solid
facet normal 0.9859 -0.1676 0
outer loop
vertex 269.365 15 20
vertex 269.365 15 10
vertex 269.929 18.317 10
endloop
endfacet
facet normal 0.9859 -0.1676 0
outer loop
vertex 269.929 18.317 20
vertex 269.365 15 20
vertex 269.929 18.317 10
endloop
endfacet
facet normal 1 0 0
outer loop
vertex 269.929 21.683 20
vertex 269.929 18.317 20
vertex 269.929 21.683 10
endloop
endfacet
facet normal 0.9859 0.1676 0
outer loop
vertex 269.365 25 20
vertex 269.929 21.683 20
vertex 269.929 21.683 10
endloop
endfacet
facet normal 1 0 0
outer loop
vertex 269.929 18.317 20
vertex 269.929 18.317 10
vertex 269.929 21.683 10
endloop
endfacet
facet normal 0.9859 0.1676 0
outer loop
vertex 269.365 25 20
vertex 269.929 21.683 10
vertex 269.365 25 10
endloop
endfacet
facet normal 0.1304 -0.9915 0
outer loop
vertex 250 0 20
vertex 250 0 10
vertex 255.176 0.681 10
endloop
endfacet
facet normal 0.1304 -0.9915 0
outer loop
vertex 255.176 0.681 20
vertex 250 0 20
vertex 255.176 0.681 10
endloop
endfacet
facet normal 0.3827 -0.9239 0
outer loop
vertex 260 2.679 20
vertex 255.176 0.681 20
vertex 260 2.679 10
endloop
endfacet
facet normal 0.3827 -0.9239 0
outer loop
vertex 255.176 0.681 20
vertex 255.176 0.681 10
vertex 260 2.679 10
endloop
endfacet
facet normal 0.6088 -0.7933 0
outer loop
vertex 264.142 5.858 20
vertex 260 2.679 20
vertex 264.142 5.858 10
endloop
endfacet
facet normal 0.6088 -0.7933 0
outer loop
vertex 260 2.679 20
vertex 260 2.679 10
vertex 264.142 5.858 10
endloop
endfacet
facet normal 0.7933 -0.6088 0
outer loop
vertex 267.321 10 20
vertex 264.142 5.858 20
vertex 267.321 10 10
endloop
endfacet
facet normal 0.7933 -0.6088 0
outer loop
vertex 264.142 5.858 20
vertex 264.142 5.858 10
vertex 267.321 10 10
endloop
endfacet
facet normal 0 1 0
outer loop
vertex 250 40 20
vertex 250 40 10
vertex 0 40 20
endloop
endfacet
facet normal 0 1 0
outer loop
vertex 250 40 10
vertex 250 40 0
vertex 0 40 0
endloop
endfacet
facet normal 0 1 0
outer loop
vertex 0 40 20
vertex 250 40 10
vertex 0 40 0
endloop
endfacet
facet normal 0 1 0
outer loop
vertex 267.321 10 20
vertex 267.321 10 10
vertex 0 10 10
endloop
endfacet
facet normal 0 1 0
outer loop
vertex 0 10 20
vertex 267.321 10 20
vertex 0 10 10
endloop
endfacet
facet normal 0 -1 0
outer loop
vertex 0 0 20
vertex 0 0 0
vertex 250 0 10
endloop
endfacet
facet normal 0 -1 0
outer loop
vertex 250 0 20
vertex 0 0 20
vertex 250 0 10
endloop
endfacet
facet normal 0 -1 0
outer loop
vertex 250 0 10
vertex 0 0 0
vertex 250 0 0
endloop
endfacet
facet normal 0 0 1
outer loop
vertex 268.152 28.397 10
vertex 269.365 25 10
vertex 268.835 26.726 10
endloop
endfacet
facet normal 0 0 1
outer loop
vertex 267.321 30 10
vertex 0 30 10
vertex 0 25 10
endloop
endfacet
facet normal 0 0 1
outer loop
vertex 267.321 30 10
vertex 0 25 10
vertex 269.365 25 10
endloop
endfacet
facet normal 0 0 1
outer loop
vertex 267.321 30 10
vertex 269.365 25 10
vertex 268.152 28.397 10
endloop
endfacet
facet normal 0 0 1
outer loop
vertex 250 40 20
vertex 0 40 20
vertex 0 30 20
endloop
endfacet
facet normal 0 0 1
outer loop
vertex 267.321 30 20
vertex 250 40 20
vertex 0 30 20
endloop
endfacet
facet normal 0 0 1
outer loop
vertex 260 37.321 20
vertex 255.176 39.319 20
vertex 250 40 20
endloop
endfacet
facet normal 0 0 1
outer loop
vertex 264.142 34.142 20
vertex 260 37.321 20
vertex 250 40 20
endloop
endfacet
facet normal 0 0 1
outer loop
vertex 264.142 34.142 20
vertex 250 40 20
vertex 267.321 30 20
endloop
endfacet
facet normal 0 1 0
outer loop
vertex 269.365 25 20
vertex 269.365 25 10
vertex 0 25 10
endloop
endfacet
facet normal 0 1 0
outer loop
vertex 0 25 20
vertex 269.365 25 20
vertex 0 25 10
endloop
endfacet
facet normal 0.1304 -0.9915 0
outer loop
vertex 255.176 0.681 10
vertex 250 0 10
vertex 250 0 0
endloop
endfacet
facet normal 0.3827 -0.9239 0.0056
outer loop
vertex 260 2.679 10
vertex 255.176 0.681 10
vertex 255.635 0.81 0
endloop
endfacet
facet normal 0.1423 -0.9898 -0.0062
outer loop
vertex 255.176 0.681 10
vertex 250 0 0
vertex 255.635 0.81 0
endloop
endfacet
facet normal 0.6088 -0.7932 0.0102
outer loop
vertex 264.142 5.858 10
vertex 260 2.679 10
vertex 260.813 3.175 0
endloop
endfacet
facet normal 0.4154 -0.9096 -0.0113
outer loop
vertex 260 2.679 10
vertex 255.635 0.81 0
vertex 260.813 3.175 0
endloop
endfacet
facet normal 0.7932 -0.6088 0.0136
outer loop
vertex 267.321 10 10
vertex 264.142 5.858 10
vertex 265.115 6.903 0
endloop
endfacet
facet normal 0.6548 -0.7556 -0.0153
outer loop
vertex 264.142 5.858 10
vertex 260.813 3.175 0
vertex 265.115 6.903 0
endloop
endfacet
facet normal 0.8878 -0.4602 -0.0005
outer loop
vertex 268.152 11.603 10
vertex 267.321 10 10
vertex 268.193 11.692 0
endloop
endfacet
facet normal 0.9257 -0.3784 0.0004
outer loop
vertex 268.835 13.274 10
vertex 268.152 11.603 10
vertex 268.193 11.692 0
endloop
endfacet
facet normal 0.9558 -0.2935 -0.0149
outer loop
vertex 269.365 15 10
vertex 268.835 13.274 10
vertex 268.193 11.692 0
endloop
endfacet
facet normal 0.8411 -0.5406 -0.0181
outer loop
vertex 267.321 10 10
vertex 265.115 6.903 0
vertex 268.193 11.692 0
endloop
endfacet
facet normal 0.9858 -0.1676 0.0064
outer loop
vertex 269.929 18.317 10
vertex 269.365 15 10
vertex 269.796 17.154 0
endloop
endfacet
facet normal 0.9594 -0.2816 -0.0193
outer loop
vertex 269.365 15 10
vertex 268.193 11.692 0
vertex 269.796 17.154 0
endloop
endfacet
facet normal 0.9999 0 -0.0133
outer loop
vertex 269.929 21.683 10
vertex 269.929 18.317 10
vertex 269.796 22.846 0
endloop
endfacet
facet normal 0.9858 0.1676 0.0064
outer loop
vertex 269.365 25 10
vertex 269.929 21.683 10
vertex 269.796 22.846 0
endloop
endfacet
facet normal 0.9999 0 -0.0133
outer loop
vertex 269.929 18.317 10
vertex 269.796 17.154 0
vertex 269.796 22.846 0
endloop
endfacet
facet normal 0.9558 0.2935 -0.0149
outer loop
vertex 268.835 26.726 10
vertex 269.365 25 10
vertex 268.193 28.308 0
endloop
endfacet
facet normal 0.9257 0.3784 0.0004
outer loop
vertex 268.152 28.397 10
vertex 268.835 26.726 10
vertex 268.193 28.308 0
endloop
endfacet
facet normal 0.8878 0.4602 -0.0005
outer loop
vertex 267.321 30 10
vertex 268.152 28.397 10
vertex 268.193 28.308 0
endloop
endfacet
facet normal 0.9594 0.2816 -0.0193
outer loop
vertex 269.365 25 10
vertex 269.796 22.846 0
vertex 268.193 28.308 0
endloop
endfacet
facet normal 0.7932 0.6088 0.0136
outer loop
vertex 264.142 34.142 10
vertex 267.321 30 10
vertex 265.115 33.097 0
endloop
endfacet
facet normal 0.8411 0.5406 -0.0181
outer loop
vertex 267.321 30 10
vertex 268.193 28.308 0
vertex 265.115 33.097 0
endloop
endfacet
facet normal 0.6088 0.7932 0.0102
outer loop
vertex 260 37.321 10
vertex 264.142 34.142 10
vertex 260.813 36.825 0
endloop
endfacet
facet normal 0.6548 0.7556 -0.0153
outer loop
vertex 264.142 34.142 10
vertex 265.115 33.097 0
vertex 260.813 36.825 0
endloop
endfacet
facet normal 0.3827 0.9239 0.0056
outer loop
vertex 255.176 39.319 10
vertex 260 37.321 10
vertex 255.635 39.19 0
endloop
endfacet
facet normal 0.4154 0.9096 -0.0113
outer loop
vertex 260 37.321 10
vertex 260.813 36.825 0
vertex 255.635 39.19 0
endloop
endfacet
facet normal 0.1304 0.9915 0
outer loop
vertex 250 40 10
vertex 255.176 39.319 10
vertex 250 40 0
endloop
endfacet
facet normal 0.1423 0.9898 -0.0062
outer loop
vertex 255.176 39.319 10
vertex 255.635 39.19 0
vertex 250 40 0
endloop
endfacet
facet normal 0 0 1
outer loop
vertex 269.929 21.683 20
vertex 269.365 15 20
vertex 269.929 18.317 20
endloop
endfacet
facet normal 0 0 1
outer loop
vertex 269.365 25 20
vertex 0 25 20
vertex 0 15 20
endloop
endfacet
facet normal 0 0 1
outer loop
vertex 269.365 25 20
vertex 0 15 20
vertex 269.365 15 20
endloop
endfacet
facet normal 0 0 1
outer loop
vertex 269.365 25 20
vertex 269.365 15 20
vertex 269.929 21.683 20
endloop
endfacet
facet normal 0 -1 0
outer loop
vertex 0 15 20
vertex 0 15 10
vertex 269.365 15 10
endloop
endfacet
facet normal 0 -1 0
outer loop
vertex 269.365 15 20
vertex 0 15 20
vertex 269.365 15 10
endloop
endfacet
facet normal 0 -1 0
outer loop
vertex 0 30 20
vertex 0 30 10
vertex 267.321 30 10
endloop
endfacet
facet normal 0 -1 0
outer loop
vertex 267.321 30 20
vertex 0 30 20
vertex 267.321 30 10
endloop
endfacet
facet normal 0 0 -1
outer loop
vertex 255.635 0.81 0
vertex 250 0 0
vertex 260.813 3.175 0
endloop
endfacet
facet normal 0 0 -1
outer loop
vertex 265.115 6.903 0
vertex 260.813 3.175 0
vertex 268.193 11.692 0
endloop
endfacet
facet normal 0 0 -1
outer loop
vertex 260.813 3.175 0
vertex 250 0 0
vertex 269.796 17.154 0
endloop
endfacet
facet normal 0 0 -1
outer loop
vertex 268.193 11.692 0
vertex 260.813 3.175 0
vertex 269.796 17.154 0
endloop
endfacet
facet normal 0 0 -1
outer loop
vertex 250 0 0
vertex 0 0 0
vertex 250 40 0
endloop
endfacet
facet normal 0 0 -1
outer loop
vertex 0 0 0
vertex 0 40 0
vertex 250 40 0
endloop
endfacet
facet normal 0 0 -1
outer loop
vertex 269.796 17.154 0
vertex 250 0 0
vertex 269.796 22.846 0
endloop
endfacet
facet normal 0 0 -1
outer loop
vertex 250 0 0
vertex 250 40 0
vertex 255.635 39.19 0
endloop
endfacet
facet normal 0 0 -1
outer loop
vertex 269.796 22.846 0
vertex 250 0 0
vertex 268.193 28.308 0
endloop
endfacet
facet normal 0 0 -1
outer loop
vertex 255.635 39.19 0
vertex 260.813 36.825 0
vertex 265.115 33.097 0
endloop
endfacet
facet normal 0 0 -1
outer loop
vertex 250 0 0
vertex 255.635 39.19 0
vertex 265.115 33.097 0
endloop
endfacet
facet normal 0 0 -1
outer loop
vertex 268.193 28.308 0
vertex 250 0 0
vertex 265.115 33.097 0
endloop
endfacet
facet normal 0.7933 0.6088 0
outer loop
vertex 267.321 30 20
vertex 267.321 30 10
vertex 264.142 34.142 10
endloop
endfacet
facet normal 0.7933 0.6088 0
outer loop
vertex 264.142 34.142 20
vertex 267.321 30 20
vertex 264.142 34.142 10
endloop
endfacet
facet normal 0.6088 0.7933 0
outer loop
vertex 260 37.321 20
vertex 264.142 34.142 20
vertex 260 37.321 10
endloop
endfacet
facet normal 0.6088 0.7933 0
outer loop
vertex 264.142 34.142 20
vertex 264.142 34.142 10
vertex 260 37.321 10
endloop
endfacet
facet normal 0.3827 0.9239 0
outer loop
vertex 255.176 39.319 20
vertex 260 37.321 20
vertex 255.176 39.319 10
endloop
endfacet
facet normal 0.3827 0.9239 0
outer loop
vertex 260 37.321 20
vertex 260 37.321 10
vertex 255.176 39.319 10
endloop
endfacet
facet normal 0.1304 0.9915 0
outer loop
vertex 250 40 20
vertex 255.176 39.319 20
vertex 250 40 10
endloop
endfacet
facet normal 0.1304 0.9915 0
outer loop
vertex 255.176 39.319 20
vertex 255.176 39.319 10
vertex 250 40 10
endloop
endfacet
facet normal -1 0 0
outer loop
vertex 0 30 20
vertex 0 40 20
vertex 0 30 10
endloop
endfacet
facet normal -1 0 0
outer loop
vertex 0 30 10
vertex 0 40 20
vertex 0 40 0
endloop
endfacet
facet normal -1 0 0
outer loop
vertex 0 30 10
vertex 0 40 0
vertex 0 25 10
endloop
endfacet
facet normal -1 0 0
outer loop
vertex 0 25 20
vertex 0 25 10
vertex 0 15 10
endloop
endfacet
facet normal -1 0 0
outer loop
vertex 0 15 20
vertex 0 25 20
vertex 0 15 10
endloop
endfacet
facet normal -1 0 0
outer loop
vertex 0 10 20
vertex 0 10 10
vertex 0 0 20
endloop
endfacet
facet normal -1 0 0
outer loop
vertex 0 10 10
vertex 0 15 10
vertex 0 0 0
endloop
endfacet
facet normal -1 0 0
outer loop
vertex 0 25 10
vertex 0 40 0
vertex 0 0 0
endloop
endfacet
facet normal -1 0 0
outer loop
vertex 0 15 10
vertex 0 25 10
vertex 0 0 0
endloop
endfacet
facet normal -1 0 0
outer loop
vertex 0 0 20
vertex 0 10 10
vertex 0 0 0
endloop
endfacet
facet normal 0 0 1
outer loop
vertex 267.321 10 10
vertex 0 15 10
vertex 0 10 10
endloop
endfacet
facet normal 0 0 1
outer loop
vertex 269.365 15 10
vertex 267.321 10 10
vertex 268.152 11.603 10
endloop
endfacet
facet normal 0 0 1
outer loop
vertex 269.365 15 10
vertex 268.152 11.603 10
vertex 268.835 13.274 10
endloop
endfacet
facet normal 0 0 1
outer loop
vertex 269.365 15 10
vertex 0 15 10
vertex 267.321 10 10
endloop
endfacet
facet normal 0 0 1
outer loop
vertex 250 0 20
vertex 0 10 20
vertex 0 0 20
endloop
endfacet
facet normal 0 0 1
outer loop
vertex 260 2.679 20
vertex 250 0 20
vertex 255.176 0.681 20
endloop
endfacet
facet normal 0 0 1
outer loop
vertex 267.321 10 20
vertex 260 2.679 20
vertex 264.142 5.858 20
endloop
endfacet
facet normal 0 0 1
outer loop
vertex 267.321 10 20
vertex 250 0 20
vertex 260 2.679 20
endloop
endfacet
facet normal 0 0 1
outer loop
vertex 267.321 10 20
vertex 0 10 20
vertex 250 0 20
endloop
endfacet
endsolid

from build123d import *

# Parameters (mm, degrees)
BOSS_EXTRUDE1_DEPTH = 10
BOSS_EXTRUDE2_DEPTH = 10


with BuildPart() as part:
    # Sketch2 → Boss-Extrude1 (new body)
    with BuildSketch(Plane.XY):
        with BuildLine():
            Line((0, 0), (250, 0))
            ThreePointArc((250, 0), (270, 20), (250, 40))
            Line((250, 40), (0, 40))
            Line((0, 40), (0, 0))
        make_face()
    extrude(amount=BOSS_EXTRUDE1_DEPTH)

    # Sketch3 → Boss-Extrude2 (add)
    with BuildSketch(Plane.XY.offset(10)):
        with BuildLine():
            ThreePointArc((250, 0), (260, 2.679491924), (267.320508076, 10))
            Line((267.320508076, 10), (115.043886481, 10))
            Line((115.043886481, 10), (0, 10))
            Line((0, 10), (0, 0))
            Line((0, 0), (250, 0))
        make_face()
        with BuildLine():
            ThreePointArc((269.364916731, 15), (270, 20), (269.364916731, 25))
            Line((269.364916731, 25), (0, 25))
            Line((0, 25), (0, 15))
            Line((0, 15), (269.364916731, 15))
        make_face()
        with BuildLine():
            ThreePointArc((267.320508076, 30), (260, 37.320508076), (250, 40))
            Line((250, 40), (0, 40))
            Line((0, 40), (0, 30))
            Line((0, 30), (267.320508076, 30))
        make_face()
    extrude(amount=BOSS_EXTRUDE2_DEPTH)


solid = part.part
